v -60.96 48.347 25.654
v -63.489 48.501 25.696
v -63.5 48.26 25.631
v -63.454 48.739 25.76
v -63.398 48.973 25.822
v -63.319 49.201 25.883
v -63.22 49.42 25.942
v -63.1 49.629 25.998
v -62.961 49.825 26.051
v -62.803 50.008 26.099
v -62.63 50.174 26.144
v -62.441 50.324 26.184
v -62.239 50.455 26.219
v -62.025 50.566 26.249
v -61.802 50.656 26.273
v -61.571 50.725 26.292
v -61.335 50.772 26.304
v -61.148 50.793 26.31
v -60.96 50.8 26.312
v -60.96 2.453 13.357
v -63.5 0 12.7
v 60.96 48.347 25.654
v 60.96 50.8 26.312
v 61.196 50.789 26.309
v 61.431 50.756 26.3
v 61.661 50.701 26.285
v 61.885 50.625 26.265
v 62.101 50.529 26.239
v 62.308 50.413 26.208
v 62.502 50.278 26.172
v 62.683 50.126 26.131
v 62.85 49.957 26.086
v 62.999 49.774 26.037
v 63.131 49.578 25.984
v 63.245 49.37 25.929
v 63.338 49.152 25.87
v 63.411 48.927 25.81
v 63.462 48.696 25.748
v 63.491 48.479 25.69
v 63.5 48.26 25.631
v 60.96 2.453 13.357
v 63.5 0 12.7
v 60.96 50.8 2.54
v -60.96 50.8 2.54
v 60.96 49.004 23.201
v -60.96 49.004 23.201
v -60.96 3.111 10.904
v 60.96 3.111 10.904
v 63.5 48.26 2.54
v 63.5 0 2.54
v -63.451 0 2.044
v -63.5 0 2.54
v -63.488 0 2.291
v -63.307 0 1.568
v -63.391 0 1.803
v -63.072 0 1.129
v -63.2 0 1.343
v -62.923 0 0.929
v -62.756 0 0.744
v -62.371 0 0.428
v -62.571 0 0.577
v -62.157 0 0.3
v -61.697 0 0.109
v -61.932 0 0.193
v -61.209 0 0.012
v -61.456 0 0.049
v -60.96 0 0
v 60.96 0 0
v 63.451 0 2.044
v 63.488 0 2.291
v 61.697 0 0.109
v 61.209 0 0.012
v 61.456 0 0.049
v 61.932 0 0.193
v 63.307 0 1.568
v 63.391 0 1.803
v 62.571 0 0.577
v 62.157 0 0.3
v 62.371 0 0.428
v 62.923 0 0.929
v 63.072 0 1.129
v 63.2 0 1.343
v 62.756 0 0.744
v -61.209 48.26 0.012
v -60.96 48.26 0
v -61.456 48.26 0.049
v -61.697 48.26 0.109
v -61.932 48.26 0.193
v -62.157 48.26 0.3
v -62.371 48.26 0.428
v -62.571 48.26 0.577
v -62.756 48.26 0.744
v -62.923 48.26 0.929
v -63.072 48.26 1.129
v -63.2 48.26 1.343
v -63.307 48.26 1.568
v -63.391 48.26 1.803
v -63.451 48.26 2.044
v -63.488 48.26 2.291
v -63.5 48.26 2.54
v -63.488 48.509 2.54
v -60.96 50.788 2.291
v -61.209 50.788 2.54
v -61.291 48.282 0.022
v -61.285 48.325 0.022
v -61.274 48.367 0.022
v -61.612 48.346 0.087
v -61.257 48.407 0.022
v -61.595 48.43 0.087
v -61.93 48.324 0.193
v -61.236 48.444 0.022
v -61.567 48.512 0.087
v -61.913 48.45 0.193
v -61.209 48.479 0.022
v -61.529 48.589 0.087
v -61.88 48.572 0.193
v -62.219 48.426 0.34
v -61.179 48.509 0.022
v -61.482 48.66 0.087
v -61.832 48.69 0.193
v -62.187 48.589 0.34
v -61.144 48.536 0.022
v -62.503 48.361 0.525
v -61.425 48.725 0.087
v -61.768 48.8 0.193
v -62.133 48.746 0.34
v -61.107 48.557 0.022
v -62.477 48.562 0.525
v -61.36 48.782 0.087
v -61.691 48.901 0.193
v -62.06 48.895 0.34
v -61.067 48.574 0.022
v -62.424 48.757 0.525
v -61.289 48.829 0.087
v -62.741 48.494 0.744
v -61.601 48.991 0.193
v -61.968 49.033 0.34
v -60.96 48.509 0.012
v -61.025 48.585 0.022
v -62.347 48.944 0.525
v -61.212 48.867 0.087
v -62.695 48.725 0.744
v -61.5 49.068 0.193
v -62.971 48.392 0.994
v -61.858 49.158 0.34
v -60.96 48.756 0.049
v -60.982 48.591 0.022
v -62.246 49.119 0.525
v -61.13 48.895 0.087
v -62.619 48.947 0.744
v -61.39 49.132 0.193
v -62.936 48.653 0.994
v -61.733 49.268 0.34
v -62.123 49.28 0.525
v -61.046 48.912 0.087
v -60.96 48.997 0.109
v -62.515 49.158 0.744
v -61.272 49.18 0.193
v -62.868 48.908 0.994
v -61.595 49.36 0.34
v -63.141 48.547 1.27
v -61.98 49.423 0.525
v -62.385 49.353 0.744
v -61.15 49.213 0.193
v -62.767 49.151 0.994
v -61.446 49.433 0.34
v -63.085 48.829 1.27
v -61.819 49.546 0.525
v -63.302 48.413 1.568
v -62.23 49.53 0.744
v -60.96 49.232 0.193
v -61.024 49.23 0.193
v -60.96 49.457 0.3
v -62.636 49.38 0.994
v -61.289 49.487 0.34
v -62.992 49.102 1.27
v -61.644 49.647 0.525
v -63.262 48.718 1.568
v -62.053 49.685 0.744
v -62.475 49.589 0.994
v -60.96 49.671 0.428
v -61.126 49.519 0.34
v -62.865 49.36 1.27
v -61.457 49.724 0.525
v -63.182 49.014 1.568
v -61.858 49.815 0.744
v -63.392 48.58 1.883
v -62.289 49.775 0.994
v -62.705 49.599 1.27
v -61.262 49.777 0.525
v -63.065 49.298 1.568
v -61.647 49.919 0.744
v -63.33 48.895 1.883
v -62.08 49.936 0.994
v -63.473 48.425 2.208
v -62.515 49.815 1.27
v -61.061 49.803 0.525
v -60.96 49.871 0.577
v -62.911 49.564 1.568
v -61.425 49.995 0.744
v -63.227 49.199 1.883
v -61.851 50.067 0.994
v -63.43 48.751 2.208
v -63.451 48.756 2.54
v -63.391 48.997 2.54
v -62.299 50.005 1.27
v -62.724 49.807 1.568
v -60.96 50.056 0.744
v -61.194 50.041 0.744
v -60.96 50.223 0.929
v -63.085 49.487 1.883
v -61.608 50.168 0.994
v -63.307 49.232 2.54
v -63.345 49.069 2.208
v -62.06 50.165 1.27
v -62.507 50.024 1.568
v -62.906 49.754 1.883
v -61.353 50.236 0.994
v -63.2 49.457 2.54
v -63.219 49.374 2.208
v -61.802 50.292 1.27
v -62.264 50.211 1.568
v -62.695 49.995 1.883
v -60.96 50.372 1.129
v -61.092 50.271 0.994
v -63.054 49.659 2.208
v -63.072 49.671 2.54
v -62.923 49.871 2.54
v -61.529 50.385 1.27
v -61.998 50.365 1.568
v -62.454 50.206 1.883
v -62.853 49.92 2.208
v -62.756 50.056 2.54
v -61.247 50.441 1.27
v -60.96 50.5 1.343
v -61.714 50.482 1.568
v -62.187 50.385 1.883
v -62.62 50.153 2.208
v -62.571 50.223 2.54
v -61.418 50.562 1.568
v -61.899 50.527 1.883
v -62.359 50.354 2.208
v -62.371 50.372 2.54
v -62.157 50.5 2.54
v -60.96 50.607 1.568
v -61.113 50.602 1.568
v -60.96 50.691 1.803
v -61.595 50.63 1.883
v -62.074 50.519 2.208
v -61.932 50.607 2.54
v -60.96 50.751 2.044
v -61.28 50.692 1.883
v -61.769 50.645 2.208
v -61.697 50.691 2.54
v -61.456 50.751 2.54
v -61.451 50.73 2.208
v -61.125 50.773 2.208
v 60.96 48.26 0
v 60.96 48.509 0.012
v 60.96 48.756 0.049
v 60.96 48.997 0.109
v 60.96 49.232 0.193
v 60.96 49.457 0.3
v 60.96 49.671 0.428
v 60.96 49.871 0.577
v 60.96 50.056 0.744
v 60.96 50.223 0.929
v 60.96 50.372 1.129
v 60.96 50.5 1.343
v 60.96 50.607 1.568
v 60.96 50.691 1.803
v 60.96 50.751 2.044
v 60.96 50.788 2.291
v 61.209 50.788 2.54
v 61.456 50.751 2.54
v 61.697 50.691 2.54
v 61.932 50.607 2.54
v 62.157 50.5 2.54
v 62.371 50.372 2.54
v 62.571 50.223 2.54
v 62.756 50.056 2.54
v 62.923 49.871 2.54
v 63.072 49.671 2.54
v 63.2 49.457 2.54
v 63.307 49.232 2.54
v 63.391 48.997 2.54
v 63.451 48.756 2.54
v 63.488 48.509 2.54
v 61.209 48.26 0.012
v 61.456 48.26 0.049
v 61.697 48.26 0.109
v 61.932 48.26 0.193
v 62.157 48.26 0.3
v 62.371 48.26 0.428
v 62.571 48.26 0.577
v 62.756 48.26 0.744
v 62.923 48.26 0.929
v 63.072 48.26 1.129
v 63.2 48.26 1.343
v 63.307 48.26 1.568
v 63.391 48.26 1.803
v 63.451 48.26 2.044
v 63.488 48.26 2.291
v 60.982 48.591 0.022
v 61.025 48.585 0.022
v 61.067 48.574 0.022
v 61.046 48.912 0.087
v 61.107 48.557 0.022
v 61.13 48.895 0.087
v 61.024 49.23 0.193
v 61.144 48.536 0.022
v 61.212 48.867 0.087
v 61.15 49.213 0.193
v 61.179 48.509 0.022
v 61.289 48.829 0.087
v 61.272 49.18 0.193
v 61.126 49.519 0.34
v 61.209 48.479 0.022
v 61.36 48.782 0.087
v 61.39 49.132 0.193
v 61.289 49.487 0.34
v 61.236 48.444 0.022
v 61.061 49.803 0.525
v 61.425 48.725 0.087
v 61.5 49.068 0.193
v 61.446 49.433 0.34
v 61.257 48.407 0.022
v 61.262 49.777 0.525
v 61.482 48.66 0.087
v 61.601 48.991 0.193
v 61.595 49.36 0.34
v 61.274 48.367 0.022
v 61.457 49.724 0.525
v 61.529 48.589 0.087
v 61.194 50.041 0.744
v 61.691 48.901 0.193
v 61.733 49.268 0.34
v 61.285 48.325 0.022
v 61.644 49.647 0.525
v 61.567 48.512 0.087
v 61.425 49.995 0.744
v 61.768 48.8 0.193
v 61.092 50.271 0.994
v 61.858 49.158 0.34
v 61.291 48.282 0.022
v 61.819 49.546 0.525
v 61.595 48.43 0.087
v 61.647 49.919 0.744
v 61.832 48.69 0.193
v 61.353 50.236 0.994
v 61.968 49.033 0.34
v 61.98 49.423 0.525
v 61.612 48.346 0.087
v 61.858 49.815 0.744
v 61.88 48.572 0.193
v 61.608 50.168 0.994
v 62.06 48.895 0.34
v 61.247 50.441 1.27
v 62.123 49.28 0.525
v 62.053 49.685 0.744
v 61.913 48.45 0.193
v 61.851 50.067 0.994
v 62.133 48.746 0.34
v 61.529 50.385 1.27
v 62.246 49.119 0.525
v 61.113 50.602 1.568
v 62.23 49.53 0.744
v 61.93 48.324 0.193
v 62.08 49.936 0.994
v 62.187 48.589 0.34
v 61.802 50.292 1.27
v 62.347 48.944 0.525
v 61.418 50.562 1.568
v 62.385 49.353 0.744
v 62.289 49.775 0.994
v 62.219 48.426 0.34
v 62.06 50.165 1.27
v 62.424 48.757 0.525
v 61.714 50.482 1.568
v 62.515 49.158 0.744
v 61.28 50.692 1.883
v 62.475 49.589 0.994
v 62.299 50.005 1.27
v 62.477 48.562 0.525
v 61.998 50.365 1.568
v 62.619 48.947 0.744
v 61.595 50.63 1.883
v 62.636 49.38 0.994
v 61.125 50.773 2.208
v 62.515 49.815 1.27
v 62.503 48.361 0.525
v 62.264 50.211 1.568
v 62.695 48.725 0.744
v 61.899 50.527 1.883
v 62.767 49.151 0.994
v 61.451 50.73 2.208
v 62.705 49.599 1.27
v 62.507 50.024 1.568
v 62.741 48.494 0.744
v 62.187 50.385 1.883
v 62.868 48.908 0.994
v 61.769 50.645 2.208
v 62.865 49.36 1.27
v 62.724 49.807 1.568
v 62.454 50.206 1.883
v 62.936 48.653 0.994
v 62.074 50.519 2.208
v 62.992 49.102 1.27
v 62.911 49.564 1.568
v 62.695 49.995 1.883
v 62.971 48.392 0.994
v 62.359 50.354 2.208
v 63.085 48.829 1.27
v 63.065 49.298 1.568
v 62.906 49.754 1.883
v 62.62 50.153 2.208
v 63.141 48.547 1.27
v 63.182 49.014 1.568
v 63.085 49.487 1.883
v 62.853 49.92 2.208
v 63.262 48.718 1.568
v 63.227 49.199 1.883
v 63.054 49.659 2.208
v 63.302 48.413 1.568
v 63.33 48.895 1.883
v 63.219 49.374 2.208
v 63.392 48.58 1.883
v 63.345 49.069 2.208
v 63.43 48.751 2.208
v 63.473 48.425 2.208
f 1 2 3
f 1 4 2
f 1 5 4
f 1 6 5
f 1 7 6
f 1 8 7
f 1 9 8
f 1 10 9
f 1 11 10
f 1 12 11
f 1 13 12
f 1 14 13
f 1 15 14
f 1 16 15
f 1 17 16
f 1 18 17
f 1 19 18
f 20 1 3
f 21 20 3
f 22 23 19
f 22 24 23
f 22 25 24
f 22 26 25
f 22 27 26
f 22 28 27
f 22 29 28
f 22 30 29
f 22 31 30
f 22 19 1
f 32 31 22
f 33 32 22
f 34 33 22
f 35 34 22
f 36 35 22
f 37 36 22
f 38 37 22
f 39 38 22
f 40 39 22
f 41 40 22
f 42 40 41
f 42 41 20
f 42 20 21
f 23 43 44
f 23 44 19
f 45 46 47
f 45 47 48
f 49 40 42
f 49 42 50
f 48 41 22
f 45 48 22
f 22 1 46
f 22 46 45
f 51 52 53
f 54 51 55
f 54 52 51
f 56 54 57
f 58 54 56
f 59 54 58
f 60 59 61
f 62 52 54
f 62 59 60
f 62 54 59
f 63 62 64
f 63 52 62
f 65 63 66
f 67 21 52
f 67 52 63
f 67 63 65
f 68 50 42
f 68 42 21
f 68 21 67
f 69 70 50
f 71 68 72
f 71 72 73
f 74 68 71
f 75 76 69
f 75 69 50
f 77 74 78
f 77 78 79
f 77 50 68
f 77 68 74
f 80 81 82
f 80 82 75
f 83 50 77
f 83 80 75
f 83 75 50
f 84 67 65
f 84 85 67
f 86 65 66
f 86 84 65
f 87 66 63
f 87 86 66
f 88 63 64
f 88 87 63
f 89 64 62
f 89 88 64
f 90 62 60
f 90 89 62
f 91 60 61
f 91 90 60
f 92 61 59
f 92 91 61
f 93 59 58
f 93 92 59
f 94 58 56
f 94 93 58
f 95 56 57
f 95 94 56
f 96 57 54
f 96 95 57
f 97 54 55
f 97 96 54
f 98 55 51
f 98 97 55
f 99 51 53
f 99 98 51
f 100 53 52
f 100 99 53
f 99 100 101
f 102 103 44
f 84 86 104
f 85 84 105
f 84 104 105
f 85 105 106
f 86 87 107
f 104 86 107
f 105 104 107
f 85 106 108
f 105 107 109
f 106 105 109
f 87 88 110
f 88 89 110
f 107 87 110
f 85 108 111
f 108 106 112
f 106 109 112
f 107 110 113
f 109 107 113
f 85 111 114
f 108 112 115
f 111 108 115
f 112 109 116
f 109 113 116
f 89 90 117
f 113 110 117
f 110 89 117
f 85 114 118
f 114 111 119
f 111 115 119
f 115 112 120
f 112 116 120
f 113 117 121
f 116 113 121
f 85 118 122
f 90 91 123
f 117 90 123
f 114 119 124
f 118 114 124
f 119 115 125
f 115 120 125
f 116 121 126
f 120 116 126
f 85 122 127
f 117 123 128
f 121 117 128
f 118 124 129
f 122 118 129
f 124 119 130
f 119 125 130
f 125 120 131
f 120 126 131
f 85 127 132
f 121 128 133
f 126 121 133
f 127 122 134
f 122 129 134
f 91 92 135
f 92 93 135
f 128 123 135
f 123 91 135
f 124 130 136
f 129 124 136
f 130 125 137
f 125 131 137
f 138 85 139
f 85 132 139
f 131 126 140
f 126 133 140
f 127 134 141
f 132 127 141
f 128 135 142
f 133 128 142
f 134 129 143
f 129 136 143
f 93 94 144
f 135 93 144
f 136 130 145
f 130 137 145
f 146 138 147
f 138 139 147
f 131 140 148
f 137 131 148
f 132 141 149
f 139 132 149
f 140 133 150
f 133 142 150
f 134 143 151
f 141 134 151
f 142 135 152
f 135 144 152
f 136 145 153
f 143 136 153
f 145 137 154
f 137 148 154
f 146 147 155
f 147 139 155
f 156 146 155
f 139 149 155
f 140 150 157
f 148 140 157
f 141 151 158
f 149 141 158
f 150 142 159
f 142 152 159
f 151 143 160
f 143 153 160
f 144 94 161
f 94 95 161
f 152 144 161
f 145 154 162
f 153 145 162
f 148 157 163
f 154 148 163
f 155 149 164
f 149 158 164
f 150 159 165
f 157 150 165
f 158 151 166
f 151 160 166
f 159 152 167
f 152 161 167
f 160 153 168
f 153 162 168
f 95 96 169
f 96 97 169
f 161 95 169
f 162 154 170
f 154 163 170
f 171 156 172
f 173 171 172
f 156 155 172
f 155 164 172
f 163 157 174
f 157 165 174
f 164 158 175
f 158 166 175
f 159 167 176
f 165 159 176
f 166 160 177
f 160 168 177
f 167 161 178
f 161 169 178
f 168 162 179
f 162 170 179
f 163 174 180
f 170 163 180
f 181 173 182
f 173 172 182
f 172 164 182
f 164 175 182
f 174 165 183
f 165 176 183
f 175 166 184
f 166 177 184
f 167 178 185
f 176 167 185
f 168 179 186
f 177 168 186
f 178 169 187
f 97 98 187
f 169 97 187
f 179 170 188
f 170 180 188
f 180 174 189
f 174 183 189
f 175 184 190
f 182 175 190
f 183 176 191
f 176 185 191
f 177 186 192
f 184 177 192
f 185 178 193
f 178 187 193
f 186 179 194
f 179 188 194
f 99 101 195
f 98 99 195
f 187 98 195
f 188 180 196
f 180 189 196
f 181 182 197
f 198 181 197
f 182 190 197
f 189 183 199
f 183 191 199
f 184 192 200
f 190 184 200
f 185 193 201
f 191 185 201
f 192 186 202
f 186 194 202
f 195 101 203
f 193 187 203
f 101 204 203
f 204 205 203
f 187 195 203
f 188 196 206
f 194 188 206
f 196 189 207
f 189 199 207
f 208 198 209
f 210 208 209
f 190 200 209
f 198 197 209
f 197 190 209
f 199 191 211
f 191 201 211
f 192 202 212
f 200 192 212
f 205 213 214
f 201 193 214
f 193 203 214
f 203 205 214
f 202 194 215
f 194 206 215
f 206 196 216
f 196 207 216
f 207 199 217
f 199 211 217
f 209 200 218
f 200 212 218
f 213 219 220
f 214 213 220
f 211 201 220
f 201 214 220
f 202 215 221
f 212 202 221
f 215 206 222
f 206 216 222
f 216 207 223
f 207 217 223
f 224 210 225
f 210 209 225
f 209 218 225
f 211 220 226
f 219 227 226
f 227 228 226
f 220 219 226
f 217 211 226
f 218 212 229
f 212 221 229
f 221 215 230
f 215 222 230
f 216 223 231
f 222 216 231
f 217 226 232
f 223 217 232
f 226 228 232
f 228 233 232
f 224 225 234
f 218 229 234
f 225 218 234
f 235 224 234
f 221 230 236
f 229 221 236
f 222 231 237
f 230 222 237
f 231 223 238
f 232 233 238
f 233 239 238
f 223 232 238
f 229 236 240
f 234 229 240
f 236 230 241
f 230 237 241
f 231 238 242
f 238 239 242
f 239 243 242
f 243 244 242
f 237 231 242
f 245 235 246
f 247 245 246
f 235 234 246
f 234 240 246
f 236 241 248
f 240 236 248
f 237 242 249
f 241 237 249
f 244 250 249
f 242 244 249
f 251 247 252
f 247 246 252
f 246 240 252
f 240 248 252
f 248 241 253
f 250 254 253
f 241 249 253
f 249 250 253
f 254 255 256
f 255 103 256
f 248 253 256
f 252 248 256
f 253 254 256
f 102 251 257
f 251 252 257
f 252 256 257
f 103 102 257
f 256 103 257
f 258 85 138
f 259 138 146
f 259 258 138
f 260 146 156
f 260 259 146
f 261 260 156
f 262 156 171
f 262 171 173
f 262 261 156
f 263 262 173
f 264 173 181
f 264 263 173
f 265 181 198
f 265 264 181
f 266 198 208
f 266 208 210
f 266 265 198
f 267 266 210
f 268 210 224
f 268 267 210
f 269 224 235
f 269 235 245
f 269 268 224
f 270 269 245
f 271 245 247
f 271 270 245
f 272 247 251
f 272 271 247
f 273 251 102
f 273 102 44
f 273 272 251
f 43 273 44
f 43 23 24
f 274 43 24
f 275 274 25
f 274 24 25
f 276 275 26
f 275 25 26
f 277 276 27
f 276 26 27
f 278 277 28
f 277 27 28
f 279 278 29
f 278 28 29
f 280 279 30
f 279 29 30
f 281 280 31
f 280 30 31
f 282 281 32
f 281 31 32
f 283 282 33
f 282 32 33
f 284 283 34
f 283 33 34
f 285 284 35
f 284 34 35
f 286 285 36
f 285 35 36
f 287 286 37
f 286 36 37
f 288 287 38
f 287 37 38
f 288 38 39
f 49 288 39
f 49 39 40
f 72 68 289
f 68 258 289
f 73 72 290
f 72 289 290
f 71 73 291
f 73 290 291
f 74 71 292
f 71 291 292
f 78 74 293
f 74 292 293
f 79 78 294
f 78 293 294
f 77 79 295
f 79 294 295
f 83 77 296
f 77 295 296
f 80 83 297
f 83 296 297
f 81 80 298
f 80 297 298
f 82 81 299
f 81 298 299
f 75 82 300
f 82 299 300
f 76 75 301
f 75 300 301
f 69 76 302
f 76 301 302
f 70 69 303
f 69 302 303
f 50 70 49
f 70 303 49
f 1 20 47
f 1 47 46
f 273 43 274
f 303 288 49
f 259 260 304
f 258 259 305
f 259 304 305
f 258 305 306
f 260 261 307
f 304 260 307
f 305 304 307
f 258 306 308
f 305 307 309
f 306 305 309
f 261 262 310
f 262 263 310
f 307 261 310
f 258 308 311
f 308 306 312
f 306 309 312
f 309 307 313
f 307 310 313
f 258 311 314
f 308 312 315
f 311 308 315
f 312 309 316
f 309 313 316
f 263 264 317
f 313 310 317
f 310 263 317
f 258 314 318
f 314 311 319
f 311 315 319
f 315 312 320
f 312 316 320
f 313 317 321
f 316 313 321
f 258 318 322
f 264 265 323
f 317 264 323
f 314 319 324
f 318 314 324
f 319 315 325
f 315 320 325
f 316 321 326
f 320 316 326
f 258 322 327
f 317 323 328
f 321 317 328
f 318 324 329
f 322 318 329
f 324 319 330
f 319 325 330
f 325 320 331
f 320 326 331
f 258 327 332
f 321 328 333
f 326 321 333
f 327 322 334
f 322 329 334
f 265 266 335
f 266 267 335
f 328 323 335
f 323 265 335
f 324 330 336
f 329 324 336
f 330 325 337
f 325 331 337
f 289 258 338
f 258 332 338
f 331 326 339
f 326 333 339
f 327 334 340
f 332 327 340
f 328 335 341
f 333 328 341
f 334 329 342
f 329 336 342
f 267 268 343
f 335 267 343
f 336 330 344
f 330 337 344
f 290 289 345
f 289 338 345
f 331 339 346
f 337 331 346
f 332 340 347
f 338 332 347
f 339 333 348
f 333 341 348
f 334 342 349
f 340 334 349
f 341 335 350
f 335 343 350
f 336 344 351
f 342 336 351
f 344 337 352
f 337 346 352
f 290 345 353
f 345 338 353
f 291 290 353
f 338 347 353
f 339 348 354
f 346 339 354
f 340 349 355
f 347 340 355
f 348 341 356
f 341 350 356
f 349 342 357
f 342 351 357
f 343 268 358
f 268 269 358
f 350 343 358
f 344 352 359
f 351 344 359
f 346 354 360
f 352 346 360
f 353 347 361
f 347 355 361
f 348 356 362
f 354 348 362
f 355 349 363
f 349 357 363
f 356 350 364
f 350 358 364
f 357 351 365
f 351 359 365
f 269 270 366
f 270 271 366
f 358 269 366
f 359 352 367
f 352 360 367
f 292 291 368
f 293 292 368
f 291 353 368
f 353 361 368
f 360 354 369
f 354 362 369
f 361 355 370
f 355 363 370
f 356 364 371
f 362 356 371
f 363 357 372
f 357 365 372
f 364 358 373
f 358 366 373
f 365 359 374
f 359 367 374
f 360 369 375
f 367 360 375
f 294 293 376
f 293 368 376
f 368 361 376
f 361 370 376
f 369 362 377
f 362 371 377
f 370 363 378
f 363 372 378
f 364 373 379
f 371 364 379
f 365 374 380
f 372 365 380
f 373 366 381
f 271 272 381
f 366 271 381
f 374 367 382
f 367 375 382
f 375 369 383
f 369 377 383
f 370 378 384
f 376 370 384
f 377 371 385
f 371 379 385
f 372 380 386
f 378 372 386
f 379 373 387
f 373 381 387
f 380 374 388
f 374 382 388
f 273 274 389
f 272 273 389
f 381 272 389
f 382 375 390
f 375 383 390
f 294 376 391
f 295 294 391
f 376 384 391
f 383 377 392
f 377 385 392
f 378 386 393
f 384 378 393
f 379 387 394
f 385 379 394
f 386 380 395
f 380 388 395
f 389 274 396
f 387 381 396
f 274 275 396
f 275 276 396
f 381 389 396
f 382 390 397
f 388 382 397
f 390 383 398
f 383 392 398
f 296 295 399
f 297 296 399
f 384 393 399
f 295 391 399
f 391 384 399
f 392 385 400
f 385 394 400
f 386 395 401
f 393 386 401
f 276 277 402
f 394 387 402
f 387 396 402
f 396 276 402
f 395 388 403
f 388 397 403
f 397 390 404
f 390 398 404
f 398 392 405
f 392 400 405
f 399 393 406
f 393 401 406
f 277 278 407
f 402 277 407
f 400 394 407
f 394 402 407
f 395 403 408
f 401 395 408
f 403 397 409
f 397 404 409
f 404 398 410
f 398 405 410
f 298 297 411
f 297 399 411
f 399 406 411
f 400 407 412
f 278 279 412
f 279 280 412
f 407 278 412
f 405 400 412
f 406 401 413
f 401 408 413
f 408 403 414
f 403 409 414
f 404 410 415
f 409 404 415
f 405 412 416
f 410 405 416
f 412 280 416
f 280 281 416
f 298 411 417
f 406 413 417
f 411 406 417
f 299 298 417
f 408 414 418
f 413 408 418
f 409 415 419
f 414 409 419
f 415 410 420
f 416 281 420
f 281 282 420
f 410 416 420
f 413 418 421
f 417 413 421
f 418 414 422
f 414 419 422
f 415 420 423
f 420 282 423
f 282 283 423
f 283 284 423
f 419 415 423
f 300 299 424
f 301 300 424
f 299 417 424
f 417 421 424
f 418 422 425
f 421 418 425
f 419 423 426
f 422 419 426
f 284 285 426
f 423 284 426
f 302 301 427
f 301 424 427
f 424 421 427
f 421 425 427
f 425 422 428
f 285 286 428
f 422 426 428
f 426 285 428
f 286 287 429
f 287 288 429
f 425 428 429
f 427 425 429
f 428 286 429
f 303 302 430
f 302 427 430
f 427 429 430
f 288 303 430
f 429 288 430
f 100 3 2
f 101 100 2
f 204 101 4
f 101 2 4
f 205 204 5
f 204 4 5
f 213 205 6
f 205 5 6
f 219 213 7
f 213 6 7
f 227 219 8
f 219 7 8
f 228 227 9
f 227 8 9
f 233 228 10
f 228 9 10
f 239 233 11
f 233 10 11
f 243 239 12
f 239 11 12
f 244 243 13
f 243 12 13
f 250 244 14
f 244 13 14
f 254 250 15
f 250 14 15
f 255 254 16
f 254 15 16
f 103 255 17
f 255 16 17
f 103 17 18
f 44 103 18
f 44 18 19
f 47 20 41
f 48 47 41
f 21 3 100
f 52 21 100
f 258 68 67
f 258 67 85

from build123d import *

# Parameters (mm, degrees)
BOSS_EXTRUDE1_DEPTH = 63.5
SKETCH2_W           = 121.92
SKETCH2_H           = 47.512029965
CUT_EXTRUDE1_DEPTH  = 2.54
FILLET1_R           = 2.54


with BuildPart() as part:
    # Sketch1 → Boss-Extrude1 (new body, symmetric)
    with BuildSketch(Plane(origin=(0, 0, 0), x_dir=(0, 0, -1), z_dir=(1, 0, 0))):
        Polygon((0, 0), (0, 50.8), (-26.311818976, 50.8), (-12.7, 0), align=None)
    extrude(amount=BOSS_EXTRUDE1_DEPTH, both=True)

    # Sketch2 → Cut-Extrude1 (cut)
    with BuildSketch(Plane(origin=(0, -3.175, 11.849261314), x_dir=(1, 0, 0), z_dir=(0, -0.258819045, 0.965925826))):
        with Locations((0, 29.583016856)):
            Rectangle(SKETCH2_W, SKETCH2_H)
    extrude(amount=-CUT_EXTRUDE1_DEPTH, mode=Mode.SUBTRACT)

    # Fillet1
    fillet1_edges = [part.edges().sort_by_distance(p)[0] for p in [
        (63.5, 50.8, 13.155909488),
        (-63.5, 50.8, 13.155909488),
        (-63.5, 25.4, 0),
        (0, 50.8, 0),
        (63.5, 25.4, 0),
    ]]
    fillet(fillet1_edges, radius=FILLET1_R)


solid = part.part
